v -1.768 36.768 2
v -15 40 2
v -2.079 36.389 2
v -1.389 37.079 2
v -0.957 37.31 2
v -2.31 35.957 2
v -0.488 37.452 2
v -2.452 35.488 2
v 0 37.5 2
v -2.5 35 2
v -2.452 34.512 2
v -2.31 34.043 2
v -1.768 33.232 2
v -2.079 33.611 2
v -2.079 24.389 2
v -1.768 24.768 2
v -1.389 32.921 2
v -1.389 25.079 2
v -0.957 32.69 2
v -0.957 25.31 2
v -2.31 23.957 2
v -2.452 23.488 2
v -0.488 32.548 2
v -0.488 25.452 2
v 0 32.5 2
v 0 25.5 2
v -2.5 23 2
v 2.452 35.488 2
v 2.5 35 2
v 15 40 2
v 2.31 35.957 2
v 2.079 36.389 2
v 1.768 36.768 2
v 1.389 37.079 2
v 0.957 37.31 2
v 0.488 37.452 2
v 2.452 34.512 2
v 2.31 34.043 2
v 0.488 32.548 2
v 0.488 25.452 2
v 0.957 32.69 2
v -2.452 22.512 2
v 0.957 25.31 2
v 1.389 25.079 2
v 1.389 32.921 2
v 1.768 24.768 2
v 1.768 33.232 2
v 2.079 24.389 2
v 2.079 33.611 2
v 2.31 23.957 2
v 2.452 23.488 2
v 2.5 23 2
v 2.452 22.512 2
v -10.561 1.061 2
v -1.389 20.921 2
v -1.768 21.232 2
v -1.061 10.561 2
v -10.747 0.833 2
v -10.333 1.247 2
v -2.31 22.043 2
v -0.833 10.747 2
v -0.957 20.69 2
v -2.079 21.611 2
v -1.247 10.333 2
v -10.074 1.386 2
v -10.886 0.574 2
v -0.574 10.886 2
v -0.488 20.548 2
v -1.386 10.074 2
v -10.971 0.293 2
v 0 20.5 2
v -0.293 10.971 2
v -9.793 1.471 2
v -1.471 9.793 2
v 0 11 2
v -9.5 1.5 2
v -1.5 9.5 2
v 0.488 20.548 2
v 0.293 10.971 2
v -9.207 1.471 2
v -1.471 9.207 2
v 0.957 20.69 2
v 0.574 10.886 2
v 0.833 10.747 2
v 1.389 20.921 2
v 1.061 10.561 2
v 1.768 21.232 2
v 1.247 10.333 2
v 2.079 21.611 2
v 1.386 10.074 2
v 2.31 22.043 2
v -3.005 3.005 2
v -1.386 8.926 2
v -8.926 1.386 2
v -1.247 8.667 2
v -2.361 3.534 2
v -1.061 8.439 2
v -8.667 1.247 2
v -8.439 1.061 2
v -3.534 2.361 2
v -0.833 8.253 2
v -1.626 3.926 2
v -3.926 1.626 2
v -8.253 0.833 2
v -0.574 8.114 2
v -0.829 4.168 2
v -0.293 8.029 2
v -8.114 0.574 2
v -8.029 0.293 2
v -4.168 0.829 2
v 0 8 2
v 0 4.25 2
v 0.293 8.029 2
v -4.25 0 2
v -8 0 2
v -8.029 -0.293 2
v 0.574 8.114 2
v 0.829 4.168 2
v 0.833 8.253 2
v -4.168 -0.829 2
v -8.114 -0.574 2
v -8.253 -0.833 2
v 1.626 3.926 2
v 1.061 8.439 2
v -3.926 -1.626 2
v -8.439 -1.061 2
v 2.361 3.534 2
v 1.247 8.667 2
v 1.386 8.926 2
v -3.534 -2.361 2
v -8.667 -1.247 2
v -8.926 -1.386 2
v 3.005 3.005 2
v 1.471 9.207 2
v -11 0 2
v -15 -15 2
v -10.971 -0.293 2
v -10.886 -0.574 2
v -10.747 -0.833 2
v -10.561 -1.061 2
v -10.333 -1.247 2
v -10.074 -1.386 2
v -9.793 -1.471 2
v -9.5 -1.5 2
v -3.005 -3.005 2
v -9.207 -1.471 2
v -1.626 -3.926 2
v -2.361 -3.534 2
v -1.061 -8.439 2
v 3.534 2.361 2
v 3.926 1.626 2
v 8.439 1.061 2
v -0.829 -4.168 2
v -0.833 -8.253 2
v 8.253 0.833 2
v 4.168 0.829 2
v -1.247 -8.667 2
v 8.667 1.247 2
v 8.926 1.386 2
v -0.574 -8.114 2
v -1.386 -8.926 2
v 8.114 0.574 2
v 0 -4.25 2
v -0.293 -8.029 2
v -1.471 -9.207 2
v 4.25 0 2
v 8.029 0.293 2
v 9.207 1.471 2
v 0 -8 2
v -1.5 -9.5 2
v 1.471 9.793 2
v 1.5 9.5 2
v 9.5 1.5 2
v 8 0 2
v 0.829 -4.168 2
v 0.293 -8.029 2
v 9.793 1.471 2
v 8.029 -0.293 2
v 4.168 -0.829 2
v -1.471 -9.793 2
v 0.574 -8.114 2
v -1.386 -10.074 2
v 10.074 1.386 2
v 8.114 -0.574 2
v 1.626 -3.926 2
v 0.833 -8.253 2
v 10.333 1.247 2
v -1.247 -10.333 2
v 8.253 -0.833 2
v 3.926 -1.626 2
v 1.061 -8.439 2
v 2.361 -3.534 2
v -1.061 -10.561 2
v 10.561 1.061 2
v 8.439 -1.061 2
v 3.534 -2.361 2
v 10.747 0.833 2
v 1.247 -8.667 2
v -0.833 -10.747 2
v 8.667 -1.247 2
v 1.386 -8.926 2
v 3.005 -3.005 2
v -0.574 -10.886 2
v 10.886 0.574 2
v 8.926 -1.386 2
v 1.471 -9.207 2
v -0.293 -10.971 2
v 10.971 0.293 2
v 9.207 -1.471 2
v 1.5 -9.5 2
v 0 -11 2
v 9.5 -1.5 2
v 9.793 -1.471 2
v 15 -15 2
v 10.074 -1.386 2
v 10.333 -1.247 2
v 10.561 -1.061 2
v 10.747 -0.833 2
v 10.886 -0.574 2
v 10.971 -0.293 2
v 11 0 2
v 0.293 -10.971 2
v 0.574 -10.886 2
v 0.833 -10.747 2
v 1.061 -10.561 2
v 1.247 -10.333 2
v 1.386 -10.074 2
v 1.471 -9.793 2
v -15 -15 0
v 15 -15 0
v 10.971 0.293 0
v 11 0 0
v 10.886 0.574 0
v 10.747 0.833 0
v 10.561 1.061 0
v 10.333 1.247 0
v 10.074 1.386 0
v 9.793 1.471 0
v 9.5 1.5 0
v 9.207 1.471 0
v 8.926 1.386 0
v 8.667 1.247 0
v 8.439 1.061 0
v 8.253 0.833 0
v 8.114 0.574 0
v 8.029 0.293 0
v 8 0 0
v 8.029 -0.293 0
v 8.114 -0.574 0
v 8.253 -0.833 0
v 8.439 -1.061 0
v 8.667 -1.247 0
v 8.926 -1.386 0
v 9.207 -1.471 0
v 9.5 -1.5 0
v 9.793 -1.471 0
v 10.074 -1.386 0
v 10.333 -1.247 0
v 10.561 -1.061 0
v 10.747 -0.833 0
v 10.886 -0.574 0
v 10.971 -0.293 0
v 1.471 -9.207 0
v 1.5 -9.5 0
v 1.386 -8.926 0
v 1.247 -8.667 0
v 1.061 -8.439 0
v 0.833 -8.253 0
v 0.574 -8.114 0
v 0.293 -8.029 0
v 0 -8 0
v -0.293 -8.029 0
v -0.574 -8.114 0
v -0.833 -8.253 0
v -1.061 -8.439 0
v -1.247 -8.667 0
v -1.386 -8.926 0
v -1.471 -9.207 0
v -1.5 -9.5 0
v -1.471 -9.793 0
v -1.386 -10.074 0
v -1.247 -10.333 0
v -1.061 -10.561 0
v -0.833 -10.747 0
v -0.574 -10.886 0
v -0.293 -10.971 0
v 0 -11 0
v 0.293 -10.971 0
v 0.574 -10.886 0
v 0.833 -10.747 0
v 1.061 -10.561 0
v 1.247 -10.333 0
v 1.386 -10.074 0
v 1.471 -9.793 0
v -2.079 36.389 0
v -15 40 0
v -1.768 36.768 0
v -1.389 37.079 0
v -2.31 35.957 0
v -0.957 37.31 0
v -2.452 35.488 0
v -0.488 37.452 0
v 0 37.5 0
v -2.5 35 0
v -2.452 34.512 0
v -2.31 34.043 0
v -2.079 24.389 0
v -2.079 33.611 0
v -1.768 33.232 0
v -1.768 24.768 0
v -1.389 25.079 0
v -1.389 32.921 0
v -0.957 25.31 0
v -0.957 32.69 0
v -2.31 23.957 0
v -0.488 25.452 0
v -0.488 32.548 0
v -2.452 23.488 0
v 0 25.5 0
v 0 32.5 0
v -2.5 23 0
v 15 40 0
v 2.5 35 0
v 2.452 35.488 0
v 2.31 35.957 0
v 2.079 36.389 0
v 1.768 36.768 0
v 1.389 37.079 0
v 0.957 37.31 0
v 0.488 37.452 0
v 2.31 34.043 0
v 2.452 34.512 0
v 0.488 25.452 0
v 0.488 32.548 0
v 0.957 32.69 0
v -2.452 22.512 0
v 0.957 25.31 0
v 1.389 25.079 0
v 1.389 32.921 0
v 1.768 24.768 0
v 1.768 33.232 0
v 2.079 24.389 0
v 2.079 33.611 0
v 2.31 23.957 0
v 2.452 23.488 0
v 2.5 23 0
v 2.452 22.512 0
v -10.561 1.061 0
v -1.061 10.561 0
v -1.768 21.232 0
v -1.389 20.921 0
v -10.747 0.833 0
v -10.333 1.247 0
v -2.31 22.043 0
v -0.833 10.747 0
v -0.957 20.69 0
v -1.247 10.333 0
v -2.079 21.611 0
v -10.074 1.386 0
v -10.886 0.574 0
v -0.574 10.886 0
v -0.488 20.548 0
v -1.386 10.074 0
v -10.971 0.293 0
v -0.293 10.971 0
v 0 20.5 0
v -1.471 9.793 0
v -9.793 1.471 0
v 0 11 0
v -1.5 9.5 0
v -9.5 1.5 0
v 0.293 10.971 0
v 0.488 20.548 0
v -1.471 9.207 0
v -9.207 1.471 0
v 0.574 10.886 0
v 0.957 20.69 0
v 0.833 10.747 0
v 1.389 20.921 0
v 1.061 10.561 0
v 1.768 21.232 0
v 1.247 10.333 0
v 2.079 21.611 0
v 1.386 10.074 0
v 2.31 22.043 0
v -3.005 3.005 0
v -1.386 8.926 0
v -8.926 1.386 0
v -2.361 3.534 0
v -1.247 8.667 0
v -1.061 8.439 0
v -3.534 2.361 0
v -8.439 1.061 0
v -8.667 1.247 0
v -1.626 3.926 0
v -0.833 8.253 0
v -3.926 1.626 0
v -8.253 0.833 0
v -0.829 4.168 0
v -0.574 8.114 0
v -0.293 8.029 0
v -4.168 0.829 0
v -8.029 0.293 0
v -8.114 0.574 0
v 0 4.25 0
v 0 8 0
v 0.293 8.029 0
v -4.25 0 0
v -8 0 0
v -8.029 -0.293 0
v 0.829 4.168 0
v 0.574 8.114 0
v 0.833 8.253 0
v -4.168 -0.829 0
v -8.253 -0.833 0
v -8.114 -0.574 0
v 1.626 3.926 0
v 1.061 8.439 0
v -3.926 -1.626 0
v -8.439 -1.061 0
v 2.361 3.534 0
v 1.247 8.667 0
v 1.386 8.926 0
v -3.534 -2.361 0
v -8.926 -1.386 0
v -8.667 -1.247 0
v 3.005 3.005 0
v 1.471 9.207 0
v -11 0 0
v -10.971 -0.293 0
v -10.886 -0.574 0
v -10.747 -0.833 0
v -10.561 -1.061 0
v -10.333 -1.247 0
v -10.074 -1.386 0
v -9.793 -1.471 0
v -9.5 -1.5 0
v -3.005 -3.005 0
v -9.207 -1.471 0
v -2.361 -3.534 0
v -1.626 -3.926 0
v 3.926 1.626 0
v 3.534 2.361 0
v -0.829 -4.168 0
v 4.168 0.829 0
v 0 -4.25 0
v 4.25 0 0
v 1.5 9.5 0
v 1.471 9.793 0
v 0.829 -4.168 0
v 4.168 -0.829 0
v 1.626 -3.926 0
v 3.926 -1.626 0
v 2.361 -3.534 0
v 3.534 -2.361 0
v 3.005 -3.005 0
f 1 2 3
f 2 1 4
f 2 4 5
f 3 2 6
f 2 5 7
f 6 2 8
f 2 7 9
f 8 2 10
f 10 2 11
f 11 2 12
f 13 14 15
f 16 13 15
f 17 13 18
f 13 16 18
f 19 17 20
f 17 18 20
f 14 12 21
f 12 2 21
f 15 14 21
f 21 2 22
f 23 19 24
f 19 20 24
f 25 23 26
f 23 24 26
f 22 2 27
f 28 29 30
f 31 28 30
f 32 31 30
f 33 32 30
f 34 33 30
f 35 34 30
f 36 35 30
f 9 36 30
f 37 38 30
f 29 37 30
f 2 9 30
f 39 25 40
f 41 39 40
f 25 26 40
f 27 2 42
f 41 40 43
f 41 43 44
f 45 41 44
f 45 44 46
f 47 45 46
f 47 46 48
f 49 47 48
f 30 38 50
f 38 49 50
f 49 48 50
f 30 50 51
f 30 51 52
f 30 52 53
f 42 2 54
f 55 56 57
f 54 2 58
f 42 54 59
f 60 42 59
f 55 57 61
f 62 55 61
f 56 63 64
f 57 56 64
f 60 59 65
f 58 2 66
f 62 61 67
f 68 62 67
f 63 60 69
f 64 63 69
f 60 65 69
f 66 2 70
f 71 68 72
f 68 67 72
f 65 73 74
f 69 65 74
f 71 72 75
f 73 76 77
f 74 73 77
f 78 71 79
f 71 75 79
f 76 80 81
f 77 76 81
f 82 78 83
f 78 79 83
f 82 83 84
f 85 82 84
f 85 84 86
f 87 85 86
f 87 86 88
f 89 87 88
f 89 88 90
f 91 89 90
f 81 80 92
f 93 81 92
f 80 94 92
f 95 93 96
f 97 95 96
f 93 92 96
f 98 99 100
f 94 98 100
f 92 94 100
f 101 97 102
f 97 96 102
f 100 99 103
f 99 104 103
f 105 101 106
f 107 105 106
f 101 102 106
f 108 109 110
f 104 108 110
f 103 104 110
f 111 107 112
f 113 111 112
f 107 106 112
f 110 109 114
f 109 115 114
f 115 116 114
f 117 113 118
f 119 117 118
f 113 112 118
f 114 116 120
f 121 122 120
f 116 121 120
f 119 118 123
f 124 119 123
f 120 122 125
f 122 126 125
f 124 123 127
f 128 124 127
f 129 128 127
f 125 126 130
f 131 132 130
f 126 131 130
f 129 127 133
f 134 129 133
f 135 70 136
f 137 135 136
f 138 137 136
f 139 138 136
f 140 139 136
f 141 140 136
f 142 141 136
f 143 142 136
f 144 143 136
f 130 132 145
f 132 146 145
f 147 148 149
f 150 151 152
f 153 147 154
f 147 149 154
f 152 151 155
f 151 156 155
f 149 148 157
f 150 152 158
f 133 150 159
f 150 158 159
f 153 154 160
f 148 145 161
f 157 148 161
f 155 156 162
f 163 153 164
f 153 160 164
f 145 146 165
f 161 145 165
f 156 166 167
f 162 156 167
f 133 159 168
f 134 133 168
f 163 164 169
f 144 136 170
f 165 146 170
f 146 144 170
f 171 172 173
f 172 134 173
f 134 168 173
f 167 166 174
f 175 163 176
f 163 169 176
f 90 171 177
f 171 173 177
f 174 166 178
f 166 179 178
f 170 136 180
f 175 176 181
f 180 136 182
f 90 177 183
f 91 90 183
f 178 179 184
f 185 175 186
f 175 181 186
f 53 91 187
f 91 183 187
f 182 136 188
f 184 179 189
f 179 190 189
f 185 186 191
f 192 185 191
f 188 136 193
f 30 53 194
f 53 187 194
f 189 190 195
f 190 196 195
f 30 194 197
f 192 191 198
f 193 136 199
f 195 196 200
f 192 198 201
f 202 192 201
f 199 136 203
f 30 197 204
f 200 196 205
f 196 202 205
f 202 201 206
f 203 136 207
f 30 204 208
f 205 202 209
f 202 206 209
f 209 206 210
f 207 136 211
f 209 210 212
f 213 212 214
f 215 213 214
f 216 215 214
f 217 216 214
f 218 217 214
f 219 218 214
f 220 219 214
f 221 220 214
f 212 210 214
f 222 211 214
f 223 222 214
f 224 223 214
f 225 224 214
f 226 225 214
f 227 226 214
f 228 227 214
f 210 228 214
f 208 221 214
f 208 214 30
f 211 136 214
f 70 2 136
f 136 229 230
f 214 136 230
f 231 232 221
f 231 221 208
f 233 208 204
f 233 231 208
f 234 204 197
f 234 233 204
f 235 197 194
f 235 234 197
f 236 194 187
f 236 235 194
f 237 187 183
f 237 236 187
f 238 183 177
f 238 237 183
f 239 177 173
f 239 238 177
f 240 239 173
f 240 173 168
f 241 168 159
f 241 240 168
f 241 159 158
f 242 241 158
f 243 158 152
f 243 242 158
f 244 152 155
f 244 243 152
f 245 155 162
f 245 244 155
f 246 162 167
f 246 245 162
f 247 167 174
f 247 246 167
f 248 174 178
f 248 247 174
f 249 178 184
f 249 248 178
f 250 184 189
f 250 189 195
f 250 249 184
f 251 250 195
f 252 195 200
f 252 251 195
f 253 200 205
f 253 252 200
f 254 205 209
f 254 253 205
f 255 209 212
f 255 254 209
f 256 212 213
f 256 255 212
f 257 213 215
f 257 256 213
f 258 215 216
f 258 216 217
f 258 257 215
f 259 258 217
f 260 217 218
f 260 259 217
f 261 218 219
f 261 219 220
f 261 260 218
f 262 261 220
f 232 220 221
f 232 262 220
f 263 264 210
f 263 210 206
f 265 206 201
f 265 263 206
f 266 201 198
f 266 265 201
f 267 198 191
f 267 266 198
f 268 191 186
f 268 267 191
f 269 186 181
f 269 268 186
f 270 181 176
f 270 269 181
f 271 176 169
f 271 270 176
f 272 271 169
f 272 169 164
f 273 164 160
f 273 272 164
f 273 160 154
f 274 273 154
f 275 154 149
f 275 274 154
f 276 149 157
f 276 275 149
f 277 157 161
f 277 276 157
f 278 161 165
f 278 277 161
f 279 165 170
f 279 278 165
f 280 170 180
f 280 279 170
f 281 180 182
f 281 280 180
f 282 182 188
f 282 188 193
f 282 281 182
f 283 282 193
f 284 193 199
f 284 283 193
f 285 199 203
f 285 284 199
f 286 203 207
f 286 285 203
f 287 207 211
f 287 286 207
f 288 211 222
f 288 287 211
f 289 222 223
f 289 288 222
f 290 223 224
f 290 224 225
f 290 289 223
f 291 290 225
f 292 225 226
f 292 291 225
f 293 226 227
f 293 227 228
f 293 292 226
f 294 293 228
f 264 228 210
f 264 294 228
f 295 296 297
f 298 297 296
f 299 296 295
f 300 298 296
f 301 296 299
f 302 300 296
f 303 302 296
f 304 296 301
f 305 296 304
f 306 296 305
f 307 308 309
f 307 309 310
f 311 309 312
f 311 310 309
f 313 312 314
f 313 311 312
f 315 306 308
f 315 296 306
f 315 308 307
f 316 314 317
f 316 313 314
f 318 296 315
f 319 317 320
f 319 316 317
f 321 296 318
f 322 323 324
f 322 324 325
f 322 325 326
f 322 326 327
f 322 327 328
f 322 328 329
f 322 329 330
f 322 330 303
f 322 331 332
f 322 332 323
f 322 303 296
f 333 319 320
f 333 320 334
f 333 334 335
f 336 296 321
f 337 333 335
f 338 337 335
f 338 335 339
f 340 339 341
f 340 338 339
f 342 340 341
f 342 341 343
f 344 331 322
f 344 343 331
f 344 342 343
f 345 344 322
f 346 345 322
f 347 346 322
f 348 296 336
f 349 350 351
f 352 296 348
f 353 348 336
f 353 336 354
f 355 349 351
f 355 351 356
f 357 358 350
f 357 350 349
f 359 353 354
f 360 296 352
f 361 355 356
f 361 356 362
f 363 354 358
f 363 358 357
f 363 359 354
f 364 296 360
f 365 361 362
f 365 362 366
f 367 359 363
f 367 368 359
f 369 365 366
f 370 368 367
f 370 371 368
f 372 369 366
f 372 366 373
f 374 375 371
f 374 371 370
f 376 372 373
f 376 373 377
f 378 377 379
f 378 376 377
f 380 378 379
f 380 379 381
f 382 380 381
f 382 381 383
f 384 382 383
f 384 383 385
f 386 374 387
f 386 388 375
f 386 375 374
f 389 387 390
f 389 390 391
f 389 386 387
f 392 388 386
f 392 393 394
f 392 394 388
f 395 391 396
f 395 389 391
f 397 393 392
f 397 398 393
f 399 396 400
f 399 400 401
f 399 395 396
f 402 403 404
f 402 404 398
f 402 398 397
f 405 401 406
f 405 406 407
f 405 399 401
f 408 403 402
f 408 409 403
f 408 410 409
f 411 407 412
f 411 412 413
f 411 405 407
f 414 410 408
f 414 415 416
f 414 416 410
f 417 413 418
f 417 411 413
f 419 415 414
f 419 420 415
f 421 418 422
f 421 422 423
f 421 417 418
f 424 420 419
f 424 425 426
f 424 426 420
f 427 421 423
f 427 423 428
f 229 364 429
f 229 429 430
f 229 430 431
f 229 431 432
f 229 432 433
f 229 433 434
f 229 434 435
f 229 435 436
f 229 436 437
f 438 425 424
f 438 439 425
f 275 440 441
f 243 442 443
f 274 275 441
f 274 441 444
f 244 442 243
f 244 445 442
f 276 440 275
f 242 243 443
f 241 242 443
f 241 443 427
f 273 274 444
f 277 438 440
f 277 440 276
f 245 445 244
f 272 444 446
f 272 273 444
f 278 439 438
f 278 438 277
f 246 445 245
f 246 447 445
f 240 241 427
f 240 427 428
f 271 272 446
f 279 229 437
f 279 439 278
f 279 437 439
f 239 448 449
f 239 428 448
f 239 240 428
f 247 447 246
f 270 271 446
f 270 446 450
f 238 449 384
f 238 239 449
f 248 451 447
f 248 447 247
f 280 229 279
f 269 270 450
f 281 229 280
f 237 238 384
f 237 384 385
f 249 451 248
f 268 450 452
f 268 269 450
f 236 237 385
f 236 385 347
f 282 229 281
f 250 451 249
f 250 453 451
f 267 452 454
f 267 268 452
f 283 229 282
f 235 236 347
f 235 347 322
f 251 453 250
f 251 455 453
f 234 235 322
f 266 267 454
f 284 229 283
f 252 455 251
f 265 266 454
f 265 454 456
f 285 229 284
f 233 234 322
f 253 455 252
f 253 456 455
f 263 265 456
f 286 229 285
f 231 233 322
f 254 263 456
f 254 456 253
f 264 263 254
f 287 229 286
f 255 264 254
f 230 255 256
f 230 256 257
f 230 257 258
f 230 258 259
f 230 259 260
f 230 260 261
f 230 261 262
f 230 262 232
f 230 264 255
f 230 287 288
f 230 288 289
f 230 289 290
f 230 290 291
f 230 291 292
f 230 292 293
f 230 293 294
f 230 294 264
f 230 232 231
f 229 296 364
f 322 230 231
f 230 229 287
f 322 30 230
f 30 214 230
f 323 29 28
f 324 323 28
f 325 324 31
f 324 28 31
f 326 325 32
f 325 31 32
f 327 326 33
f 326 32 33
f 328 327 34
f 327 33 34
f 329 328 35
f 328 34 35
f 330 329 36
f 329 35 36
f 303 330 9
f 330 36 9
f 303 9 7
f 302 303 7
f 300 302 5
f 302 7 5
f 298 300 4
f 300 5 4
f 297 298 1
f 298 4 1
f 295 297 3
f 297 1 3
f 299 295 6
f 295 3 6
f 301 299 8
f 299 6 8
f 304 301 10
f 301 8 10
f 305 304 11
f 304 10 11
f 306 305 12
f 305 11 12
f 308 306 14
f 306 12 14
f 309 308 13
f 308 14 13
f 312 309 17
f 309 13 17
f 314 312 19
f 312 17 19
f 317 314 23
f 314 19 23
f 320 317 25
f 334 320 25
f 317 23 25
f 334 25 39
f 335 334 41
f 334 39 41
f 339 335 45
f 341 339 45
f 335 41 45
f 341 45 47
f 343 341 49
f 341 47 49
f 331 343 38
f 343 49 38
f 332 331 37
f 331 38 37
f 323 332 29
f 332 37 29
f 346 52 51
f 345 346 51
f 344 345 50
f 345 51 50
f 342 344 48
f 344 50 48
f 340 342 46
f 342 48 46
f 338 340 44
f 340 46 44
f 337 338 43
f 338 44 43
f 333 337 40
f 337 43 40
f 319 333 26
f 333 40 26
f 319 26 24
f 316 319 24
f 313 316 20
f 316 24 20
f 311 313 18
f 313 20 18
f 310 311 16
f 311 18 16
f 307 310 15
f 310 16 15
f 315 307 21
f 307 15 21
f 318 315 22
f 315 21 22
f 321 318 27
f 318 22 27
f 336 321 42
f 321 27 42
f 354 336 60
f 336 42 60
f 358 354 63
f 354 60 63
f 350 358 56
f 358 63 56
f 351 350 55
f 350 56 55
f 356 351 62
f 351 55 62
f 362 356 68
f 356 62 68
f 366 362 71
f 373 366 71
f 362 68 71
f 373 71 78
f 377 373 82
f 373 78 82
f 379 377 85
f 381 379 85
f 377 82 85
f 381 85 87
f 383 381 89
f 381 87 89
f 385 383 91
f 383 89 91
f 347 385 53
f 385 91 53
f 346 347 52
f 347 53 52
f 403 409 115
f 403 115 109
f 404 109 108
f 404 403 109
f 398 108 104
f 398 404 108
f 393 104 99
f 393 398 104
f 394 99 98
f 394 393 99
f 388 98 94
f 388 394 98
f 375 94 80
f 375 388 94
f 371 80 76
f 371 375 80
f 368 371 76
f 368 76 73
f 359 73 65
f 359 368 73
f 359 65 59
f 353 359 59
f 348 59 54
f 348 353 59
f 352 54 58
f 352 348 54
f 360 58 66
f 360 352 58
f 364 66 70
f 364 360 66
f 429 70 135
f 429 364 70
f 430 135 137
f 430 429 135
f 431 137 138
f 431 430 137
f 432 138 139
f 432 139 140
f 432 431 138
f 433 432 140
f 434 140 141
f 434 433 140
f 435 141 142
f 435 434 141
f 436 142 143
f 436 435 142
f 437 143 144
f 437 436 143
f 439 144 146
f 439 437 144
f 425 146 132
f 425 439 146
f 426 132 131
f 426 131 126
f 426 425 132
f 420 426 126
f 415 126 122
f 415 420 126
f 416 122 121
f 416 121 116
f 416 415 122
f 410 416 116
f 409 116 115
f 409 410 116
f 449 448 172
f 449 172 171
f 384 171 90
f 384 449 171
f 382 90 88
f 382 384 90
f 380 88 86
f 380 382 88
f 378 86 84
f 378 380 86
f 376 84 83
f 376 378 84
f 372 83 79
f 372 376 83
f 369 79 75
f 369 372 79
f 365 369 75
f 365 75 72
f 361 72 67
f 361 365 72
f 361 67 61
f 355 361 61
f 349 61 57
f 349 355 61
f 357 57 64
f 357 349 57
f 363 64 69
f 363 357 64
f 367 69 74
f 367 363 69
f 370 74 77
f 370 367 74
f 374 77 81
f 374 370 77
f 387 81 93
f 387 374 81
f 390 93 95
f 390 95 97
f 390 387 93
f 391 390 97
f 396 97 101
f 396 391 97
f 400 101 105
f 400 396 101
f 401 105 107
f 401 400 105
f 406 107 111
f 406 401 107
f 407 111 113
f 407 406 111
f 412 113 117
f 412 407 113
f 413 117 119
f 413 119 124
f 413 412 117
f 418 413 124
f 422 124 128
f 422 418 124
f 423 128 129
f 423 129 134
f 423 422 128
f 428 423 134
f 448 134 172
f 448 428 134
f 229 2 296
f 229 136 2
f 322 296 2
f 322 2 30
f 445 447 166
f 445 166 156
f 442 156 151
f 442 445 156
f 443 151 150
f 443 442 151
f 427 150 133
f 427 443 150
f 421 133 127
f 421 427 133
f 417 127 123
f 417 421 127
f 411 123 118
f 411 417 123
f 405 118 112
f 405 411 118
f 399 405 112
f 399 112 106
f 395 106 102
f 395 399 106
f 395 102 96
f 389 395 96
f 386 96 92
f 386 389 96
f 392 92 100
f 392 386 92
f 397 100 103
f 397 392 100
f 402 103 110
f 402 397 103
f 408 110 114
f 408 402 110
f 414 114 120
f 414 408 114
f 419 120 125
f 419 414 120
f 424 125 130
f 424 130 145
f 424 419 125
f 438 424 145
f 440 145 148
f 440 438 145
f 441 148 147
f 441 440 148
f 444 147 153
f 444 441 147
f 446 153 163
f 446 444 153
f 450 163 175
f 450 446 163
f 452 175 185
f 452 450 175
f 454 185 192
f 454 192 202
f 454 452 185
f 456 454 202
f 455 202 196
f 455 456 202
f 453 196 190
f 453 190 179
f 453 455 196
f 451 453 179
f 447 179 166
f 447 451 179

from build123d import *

# Parameters (mm, degrees)
SKETCH1_W           = 30
SKETCH1_H           = 30
SKETCH1_R           = 4.25
SKETCH1_R_2         = 1.5
BOSS_EXTRUDE1_DEPTH = 2
SKETCH2_W           = 30
SKETCH2_H           = 2
BOSS_EXTRUDE2_DEPTH = 25
SKETCH3_R           = 2.5
CUT_EXTRUDE1_DEPTH  = 2


with BuildPart() as part:
    # Sketch1 → Boss-Extrude1 (new body)
    with BuildSketch(Plane.XY):
        Rectangle(SKETCH1_W, SKETCH1_H)
        Circle(SKETCH1_R, mode=Mode.SUBTRACT)
        with Locations((0, 9.5)):
            Circle(SKETCH1_R_2, mode=Mode.SUBTRACT)
        with Locations((9.5, 0)):
            Circle(SKETCH1_R_2, mode=Mode.SUBTRACT)
        with Locations((0, -9.5)):
            Circle(SKETCH1_R_2, mode=Mode.SUBTRACT)
        with Locations((-9.5, 0)):
            Circle(SKETCH1_R_2, mode=Mode.SUBTRACT)
    extrude(amount=BOSS_EXTRUDE1_DEPTH)

    # Sketch2 → Boss-Extrude2 (add)
    with BuildSketch(Plane(origin=(0, 15, 0), x_dir=(1, 0, 0), z_dir=(0, 1, 0))):
        with Locations((0, -1)):
            Rectangle(SKETCH2_W, SKETCH2_H)
    extrude(amount=BOSS_EXTRUDE2_DEPTH)

    # Sketch3 → Cut-Extrude1 (cut)
    with BuildSketch(Plane.XY.offset(2)):
        with Locations((0, 23)):
            Circle(SKETCH3_R)
        with Locations((0, 35)):
            Circle(SKETCH3_R)
    extrude(amount=-CUT_EXTRUDE1_DEPTH, mode=Mode.SUBTRACT)


solid = part.part
